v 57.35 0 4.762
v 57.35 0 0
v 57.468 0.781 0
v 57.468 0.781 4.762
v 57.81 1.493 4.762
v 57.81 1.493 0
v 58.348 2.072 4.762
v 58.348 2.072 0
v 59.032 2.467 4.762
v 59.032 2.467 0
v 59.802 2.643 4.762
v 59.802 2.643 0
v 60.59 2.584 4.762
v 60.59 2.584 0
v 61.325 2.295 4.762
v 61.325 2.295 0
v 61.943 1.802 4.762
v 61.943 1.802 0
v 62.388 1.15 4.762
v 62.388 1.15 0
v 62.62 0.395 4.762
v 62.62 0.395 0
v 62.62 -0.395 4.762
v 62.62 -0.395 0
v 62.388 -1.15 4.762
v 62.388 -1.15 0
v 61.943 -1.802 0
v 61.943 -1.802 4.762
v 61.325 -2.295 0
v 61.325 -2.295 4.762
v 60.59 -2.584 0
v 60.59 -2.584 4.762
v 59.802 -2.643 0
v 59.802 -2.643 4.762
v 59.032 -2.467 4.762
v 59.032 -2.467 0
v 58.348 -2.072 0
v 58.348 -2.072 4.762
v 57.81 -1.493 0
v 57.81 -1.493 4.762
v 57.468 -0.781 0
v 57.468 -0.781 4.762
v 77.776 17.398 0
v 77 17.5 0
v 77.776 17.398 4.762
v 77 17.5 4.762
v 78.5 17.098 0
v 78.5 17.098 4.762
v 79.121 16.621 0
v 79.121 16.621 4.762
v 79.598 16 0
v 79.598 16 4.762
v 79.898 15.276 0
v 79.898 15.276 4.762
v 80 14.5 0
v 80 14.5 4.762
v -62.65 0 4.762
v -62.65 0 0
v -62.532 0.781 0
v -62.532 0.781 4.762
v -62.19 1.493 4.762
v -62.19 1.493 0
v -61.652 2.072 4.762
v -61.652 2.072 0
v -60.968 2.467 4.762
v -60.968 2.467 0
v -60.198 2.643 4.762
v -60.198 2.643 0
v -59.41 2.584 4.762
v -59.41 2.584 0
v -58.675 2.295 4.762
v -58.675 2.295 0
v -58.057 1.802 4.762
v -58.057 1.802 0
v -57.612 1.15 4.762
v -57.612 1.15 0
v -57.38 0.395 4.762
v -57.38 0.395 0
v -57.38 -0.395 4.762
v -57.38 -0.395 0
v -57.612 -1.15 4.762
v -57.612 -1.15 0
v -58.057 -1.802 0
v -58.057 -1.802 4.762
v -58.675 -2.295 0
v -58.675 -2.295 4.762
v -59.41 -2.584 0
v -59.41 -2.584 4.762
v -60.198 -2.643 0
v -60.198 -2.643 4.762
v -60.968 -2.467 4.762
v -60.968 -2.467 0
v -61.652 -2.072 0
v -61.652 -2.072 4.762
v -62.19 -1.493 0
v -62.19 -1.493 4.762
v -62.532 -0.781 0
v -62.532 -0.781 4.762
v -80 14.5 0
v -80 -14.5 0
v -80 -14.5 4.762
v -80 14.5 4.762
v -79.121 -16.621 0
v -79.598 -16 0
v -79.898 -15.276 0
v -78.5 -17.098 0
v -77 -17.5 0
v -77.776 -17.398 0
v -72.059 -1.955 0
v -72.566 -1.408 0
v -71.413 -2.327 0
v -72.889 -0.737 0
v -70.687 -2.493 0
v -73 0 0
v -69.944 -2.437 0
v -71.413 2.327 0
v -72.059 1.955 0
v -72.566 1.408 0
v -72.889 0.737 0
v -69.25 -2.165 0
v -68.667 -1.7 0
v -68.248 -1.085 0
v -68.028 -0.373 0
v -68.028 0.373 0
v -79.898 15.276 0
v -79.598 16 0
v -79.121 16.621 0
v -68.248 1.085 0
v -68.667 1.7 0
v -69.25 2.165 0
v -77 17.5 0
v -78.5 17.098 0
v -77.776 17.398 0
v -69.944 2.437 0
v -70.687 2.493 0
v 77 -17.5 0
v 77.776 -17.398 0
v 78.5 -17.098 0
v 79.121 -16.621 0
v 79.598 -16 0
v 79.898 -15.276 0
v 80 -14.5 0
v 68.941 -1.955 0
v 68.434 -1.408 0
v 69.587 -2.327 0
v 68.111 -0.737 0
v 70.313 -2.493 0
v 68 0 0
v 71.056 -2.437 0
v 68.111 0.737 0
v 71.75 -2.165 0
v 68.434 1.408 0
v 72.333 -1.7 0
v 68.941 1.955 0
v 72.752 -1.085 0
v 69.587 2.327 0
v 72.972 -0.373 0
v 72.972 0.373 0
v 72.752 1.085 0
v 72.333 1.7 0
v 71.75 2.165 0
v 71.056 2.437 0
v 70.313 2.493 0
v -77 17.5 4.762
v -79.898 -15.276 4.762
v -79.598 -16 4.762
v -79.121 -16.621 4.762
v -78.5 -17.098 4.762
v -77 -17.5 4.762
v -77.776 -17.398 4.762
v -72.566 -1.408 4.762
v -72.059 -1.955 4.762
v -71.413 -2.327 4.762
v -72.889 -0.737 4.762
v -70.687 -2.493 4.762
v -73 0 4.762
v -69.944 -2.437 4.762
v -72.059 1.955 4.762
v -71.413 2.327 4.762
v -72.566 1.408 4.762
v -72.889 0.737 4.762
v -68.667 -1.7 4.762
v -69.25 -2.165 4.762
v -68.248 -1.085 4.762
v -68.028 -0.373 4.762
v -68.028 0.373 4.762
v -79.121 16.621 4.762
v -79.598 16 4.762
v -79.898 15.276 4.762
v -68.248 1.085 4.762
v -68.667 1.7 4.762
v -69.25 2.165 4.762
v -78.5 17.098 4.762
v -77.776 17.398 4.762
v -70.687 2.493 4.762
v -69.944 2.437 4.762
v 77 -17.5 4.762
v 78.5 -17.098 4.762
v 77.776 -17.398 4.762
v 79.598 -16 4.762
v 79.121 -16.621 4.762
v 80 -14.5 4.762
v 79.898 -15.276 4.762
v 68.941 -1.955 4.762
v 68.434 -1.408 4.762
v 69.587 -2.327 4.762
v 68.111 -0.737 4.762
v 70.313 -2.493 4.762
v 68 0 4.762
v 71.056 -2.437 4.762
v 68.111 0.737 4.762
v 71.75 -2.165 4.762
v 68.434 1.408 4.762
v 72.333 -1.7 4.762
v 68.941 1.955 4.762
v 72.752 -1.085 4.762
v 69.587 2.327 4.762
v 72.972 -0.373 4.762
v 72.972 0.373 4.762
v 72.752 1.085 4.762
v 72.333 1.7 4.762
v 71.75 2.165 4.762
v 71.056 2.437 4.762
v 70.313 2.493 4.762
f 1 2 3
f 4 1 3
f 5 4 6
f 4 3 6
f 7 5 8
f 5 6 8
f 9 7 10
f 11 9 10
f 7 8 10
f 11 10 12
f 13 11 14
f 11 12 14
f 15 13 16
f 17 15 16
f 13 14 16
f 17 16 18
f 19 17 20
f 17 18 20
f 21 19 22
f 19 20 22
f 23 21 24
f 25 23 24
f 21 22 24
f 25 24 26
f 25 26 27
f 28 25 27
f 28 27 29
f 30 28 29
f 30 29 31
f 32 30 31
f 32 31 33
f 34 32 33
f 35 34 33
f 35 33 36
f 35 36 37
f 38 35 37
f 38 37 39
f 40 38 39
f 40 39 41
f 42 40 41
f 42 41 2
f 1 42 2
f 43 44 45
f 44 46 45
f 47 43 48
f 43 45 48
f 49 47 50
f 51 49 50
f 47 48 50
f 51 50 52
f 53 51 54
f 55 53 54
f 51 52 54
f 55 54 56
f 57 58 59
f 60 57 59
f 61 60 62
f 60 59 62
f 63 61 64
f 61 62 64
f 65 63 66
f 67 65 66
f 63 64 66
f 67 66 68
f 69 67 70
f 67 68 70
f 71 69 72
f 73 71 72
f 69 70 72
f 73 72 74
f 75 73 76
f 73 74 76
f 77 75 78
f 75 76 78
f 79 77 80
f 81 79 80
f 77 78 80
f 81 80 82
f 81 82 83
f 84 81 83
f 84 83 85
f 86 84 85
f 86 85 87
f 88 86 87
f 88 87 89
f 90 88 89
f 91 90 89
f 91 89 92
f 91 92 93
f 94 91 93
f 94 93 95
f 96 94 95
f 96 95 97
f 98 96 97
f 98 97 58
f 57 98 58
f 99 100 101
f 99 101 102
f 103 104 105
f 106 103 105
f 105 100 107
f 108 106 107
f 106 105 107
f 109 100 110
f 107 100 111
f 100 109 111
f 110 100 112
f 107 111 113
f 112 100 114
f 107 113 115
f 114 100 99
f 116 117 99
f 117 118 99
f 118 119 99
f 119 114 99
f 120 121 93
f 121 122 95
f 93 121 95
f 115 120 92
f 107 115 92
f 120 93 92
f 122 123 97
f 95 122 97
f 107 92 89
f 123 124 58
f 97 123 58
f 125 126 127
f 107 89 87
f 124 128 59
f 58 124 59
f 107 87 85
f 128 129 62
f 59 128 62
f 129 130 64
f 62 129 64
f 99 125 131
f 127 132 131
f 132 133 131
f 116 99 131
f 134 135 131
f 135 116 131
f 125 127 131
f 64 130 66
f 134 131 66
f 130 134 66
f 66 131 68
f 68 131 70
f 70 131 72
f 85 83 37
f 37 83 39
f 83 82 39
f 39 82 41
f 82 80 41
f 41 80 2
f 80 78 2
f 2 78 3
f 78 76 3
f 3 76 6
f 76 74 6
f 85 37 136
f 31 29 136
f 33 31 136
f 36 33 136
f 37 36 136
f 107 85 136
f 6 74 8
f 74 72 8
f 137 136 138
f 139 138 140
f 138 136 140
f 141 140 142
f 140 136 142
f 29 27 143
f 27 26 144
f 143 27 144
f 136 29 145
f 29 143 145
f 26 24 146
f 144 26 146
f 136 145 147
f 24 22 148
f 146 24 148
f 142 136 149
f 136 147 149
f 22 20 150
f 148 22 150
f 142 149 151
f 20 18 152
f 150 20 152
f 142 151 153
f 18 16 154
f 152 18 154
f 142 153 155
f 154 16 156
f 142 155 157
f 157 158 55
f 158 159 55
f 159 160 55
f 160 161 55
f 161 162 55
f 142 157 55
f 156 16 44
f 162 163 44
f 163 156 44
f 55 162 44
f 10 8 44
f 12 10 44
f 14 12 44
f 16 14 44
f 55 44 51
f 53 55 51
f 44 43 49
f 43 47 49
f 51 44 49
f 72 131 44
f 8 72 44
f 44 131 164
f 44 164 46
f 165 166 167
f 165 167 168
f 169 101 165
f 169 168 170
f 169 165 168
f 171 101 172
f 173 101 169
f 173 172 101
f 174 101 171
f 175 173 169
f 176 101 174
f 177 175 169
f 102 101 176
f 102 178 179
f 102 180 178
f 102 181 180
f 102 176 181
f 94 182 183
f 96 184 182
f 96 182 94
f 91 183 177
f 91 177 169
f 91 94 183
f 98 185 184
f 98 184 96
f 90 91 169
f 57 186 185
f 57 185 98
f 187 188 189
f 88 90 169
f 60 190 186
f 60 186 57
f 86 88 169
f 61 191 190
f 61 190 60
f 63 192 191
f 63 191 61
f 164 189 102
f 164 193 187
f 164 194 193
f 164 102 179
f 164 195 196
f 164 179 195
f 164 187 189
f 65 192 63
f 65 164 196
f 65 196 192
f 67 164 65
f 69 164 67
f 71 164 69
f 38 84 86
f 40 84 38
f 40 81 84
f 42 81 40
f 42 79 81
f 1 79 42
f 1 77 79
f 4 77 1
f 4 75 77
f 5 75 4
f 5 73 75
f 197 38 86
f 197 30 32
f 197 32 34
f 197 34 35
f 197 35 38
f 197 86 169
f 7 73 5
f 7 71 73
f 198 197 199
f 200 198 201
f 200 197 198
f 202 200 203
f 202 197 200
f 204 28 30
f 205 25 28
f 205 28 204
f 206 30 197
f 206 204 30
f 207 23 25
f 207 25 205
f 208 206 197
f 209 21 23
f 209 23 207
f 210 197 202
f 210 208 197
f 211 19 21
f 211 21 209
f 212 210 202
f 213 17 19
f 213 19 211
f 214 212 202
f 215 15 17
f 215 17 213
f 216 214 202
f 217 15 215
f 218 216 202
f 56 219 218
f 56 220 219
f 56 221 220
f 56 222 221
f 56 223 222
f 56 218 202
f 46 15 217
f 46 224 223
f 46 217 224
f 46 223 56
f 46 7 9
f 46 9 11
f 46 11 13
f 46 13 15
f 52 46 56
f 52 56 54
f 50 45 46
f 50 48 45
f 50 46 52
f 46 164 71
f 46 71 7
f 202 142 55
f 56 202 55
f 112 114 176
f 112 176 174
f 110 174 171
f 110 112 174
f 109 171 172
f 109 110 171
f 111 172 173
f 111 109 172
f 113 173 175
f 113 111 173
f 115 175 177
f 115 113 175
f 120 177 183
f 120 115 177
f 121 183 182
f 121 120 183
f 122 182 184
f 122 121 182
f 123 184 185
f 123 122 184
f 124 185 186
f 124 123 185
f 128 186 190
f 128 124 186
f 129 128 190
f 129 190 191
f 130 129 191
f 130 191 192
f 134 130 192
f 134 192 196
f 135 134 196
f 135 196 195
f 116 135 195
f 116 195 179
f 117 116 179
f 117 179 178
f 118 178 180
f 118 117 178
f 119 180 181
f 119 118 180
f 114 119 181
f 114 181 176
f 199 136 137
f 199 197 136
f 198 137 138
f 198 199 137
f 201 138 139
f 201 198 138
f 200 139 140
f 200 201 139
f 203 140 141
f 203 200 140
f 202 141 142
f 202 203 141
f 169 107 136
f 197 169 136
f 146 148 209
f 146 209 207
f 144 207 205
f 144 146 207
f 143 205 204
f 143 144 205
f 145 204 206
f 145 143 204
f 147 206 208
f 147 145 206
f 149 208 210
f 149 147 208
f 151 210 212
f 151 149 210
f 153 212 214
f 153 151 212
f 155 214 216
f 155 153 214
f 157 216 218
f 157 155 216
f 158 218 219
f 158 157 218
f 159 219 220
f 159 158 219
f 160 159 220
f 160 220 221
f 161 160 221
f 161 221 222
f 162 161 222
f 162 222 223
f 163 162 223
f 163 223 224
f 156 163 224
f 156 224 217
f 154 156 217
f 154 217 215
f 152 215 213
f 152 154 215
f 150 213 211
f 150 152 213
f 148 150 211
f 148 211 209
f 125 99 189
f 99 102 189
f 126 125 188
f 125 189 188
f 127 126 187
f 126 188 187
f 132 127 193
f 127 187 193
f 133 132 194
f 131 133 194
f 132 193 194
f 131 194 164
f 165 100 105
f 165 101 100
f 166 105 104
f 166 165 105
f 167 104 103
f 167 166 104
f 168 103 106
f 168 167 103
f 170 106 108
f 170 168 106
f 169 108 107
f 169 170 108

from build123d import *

# Parameters (mm, degrees)
SKETCH1_W            = 160
SKETCH1_H            = 35
SKETCH1_R            = 2.5
BOSS_EXTRUDE1_DEPTH  = 4.7625
M5_CLEARANCE_HOLE1_D = 5.3
FILLET1_R            = 3


with BuildPart() as part:
    # Sketch1 → Boss-Extrude1 (new body)
    with BuildSketch(Plane.XY):
        Rectangle(SKETCH1_W, SKETCH1_H)
        with Locations(Location((-70.5, 0, 0), (0, 0, 180))):
            Circle(SKETCH1_R, mode=Mode.SUBTRACT)
        with Locations(Location((70.5, 0, 0), (0, 0, 180))):
            Circle(SKETCH1_R, mode=Mode.SUBTRACT)
    extrude(amount=BOSS_EXTRUDE1_DEPTH)

    # M5 Clearance Hole1 (through all)
    with Locations(Plane.XY.offset(4.7625)):
        with Locations((-60, 0), (60, 0)):
            Hole(M5_CLEARANCE_HOLE1_D / 2)

    # Fillet1
    fillet1_edges = [part.edges().sort_by_distance(p)[0] for p in [
        (80, -17.5, 2.38125),
        (-80, -17.5, 2.38125),
        (-80, 17.5, 2.38125),
        (80, 17.5, 2.38125),
    ]]
    fillet(fillet1_edges, radius=FILLET1_R)


solid = part.part
